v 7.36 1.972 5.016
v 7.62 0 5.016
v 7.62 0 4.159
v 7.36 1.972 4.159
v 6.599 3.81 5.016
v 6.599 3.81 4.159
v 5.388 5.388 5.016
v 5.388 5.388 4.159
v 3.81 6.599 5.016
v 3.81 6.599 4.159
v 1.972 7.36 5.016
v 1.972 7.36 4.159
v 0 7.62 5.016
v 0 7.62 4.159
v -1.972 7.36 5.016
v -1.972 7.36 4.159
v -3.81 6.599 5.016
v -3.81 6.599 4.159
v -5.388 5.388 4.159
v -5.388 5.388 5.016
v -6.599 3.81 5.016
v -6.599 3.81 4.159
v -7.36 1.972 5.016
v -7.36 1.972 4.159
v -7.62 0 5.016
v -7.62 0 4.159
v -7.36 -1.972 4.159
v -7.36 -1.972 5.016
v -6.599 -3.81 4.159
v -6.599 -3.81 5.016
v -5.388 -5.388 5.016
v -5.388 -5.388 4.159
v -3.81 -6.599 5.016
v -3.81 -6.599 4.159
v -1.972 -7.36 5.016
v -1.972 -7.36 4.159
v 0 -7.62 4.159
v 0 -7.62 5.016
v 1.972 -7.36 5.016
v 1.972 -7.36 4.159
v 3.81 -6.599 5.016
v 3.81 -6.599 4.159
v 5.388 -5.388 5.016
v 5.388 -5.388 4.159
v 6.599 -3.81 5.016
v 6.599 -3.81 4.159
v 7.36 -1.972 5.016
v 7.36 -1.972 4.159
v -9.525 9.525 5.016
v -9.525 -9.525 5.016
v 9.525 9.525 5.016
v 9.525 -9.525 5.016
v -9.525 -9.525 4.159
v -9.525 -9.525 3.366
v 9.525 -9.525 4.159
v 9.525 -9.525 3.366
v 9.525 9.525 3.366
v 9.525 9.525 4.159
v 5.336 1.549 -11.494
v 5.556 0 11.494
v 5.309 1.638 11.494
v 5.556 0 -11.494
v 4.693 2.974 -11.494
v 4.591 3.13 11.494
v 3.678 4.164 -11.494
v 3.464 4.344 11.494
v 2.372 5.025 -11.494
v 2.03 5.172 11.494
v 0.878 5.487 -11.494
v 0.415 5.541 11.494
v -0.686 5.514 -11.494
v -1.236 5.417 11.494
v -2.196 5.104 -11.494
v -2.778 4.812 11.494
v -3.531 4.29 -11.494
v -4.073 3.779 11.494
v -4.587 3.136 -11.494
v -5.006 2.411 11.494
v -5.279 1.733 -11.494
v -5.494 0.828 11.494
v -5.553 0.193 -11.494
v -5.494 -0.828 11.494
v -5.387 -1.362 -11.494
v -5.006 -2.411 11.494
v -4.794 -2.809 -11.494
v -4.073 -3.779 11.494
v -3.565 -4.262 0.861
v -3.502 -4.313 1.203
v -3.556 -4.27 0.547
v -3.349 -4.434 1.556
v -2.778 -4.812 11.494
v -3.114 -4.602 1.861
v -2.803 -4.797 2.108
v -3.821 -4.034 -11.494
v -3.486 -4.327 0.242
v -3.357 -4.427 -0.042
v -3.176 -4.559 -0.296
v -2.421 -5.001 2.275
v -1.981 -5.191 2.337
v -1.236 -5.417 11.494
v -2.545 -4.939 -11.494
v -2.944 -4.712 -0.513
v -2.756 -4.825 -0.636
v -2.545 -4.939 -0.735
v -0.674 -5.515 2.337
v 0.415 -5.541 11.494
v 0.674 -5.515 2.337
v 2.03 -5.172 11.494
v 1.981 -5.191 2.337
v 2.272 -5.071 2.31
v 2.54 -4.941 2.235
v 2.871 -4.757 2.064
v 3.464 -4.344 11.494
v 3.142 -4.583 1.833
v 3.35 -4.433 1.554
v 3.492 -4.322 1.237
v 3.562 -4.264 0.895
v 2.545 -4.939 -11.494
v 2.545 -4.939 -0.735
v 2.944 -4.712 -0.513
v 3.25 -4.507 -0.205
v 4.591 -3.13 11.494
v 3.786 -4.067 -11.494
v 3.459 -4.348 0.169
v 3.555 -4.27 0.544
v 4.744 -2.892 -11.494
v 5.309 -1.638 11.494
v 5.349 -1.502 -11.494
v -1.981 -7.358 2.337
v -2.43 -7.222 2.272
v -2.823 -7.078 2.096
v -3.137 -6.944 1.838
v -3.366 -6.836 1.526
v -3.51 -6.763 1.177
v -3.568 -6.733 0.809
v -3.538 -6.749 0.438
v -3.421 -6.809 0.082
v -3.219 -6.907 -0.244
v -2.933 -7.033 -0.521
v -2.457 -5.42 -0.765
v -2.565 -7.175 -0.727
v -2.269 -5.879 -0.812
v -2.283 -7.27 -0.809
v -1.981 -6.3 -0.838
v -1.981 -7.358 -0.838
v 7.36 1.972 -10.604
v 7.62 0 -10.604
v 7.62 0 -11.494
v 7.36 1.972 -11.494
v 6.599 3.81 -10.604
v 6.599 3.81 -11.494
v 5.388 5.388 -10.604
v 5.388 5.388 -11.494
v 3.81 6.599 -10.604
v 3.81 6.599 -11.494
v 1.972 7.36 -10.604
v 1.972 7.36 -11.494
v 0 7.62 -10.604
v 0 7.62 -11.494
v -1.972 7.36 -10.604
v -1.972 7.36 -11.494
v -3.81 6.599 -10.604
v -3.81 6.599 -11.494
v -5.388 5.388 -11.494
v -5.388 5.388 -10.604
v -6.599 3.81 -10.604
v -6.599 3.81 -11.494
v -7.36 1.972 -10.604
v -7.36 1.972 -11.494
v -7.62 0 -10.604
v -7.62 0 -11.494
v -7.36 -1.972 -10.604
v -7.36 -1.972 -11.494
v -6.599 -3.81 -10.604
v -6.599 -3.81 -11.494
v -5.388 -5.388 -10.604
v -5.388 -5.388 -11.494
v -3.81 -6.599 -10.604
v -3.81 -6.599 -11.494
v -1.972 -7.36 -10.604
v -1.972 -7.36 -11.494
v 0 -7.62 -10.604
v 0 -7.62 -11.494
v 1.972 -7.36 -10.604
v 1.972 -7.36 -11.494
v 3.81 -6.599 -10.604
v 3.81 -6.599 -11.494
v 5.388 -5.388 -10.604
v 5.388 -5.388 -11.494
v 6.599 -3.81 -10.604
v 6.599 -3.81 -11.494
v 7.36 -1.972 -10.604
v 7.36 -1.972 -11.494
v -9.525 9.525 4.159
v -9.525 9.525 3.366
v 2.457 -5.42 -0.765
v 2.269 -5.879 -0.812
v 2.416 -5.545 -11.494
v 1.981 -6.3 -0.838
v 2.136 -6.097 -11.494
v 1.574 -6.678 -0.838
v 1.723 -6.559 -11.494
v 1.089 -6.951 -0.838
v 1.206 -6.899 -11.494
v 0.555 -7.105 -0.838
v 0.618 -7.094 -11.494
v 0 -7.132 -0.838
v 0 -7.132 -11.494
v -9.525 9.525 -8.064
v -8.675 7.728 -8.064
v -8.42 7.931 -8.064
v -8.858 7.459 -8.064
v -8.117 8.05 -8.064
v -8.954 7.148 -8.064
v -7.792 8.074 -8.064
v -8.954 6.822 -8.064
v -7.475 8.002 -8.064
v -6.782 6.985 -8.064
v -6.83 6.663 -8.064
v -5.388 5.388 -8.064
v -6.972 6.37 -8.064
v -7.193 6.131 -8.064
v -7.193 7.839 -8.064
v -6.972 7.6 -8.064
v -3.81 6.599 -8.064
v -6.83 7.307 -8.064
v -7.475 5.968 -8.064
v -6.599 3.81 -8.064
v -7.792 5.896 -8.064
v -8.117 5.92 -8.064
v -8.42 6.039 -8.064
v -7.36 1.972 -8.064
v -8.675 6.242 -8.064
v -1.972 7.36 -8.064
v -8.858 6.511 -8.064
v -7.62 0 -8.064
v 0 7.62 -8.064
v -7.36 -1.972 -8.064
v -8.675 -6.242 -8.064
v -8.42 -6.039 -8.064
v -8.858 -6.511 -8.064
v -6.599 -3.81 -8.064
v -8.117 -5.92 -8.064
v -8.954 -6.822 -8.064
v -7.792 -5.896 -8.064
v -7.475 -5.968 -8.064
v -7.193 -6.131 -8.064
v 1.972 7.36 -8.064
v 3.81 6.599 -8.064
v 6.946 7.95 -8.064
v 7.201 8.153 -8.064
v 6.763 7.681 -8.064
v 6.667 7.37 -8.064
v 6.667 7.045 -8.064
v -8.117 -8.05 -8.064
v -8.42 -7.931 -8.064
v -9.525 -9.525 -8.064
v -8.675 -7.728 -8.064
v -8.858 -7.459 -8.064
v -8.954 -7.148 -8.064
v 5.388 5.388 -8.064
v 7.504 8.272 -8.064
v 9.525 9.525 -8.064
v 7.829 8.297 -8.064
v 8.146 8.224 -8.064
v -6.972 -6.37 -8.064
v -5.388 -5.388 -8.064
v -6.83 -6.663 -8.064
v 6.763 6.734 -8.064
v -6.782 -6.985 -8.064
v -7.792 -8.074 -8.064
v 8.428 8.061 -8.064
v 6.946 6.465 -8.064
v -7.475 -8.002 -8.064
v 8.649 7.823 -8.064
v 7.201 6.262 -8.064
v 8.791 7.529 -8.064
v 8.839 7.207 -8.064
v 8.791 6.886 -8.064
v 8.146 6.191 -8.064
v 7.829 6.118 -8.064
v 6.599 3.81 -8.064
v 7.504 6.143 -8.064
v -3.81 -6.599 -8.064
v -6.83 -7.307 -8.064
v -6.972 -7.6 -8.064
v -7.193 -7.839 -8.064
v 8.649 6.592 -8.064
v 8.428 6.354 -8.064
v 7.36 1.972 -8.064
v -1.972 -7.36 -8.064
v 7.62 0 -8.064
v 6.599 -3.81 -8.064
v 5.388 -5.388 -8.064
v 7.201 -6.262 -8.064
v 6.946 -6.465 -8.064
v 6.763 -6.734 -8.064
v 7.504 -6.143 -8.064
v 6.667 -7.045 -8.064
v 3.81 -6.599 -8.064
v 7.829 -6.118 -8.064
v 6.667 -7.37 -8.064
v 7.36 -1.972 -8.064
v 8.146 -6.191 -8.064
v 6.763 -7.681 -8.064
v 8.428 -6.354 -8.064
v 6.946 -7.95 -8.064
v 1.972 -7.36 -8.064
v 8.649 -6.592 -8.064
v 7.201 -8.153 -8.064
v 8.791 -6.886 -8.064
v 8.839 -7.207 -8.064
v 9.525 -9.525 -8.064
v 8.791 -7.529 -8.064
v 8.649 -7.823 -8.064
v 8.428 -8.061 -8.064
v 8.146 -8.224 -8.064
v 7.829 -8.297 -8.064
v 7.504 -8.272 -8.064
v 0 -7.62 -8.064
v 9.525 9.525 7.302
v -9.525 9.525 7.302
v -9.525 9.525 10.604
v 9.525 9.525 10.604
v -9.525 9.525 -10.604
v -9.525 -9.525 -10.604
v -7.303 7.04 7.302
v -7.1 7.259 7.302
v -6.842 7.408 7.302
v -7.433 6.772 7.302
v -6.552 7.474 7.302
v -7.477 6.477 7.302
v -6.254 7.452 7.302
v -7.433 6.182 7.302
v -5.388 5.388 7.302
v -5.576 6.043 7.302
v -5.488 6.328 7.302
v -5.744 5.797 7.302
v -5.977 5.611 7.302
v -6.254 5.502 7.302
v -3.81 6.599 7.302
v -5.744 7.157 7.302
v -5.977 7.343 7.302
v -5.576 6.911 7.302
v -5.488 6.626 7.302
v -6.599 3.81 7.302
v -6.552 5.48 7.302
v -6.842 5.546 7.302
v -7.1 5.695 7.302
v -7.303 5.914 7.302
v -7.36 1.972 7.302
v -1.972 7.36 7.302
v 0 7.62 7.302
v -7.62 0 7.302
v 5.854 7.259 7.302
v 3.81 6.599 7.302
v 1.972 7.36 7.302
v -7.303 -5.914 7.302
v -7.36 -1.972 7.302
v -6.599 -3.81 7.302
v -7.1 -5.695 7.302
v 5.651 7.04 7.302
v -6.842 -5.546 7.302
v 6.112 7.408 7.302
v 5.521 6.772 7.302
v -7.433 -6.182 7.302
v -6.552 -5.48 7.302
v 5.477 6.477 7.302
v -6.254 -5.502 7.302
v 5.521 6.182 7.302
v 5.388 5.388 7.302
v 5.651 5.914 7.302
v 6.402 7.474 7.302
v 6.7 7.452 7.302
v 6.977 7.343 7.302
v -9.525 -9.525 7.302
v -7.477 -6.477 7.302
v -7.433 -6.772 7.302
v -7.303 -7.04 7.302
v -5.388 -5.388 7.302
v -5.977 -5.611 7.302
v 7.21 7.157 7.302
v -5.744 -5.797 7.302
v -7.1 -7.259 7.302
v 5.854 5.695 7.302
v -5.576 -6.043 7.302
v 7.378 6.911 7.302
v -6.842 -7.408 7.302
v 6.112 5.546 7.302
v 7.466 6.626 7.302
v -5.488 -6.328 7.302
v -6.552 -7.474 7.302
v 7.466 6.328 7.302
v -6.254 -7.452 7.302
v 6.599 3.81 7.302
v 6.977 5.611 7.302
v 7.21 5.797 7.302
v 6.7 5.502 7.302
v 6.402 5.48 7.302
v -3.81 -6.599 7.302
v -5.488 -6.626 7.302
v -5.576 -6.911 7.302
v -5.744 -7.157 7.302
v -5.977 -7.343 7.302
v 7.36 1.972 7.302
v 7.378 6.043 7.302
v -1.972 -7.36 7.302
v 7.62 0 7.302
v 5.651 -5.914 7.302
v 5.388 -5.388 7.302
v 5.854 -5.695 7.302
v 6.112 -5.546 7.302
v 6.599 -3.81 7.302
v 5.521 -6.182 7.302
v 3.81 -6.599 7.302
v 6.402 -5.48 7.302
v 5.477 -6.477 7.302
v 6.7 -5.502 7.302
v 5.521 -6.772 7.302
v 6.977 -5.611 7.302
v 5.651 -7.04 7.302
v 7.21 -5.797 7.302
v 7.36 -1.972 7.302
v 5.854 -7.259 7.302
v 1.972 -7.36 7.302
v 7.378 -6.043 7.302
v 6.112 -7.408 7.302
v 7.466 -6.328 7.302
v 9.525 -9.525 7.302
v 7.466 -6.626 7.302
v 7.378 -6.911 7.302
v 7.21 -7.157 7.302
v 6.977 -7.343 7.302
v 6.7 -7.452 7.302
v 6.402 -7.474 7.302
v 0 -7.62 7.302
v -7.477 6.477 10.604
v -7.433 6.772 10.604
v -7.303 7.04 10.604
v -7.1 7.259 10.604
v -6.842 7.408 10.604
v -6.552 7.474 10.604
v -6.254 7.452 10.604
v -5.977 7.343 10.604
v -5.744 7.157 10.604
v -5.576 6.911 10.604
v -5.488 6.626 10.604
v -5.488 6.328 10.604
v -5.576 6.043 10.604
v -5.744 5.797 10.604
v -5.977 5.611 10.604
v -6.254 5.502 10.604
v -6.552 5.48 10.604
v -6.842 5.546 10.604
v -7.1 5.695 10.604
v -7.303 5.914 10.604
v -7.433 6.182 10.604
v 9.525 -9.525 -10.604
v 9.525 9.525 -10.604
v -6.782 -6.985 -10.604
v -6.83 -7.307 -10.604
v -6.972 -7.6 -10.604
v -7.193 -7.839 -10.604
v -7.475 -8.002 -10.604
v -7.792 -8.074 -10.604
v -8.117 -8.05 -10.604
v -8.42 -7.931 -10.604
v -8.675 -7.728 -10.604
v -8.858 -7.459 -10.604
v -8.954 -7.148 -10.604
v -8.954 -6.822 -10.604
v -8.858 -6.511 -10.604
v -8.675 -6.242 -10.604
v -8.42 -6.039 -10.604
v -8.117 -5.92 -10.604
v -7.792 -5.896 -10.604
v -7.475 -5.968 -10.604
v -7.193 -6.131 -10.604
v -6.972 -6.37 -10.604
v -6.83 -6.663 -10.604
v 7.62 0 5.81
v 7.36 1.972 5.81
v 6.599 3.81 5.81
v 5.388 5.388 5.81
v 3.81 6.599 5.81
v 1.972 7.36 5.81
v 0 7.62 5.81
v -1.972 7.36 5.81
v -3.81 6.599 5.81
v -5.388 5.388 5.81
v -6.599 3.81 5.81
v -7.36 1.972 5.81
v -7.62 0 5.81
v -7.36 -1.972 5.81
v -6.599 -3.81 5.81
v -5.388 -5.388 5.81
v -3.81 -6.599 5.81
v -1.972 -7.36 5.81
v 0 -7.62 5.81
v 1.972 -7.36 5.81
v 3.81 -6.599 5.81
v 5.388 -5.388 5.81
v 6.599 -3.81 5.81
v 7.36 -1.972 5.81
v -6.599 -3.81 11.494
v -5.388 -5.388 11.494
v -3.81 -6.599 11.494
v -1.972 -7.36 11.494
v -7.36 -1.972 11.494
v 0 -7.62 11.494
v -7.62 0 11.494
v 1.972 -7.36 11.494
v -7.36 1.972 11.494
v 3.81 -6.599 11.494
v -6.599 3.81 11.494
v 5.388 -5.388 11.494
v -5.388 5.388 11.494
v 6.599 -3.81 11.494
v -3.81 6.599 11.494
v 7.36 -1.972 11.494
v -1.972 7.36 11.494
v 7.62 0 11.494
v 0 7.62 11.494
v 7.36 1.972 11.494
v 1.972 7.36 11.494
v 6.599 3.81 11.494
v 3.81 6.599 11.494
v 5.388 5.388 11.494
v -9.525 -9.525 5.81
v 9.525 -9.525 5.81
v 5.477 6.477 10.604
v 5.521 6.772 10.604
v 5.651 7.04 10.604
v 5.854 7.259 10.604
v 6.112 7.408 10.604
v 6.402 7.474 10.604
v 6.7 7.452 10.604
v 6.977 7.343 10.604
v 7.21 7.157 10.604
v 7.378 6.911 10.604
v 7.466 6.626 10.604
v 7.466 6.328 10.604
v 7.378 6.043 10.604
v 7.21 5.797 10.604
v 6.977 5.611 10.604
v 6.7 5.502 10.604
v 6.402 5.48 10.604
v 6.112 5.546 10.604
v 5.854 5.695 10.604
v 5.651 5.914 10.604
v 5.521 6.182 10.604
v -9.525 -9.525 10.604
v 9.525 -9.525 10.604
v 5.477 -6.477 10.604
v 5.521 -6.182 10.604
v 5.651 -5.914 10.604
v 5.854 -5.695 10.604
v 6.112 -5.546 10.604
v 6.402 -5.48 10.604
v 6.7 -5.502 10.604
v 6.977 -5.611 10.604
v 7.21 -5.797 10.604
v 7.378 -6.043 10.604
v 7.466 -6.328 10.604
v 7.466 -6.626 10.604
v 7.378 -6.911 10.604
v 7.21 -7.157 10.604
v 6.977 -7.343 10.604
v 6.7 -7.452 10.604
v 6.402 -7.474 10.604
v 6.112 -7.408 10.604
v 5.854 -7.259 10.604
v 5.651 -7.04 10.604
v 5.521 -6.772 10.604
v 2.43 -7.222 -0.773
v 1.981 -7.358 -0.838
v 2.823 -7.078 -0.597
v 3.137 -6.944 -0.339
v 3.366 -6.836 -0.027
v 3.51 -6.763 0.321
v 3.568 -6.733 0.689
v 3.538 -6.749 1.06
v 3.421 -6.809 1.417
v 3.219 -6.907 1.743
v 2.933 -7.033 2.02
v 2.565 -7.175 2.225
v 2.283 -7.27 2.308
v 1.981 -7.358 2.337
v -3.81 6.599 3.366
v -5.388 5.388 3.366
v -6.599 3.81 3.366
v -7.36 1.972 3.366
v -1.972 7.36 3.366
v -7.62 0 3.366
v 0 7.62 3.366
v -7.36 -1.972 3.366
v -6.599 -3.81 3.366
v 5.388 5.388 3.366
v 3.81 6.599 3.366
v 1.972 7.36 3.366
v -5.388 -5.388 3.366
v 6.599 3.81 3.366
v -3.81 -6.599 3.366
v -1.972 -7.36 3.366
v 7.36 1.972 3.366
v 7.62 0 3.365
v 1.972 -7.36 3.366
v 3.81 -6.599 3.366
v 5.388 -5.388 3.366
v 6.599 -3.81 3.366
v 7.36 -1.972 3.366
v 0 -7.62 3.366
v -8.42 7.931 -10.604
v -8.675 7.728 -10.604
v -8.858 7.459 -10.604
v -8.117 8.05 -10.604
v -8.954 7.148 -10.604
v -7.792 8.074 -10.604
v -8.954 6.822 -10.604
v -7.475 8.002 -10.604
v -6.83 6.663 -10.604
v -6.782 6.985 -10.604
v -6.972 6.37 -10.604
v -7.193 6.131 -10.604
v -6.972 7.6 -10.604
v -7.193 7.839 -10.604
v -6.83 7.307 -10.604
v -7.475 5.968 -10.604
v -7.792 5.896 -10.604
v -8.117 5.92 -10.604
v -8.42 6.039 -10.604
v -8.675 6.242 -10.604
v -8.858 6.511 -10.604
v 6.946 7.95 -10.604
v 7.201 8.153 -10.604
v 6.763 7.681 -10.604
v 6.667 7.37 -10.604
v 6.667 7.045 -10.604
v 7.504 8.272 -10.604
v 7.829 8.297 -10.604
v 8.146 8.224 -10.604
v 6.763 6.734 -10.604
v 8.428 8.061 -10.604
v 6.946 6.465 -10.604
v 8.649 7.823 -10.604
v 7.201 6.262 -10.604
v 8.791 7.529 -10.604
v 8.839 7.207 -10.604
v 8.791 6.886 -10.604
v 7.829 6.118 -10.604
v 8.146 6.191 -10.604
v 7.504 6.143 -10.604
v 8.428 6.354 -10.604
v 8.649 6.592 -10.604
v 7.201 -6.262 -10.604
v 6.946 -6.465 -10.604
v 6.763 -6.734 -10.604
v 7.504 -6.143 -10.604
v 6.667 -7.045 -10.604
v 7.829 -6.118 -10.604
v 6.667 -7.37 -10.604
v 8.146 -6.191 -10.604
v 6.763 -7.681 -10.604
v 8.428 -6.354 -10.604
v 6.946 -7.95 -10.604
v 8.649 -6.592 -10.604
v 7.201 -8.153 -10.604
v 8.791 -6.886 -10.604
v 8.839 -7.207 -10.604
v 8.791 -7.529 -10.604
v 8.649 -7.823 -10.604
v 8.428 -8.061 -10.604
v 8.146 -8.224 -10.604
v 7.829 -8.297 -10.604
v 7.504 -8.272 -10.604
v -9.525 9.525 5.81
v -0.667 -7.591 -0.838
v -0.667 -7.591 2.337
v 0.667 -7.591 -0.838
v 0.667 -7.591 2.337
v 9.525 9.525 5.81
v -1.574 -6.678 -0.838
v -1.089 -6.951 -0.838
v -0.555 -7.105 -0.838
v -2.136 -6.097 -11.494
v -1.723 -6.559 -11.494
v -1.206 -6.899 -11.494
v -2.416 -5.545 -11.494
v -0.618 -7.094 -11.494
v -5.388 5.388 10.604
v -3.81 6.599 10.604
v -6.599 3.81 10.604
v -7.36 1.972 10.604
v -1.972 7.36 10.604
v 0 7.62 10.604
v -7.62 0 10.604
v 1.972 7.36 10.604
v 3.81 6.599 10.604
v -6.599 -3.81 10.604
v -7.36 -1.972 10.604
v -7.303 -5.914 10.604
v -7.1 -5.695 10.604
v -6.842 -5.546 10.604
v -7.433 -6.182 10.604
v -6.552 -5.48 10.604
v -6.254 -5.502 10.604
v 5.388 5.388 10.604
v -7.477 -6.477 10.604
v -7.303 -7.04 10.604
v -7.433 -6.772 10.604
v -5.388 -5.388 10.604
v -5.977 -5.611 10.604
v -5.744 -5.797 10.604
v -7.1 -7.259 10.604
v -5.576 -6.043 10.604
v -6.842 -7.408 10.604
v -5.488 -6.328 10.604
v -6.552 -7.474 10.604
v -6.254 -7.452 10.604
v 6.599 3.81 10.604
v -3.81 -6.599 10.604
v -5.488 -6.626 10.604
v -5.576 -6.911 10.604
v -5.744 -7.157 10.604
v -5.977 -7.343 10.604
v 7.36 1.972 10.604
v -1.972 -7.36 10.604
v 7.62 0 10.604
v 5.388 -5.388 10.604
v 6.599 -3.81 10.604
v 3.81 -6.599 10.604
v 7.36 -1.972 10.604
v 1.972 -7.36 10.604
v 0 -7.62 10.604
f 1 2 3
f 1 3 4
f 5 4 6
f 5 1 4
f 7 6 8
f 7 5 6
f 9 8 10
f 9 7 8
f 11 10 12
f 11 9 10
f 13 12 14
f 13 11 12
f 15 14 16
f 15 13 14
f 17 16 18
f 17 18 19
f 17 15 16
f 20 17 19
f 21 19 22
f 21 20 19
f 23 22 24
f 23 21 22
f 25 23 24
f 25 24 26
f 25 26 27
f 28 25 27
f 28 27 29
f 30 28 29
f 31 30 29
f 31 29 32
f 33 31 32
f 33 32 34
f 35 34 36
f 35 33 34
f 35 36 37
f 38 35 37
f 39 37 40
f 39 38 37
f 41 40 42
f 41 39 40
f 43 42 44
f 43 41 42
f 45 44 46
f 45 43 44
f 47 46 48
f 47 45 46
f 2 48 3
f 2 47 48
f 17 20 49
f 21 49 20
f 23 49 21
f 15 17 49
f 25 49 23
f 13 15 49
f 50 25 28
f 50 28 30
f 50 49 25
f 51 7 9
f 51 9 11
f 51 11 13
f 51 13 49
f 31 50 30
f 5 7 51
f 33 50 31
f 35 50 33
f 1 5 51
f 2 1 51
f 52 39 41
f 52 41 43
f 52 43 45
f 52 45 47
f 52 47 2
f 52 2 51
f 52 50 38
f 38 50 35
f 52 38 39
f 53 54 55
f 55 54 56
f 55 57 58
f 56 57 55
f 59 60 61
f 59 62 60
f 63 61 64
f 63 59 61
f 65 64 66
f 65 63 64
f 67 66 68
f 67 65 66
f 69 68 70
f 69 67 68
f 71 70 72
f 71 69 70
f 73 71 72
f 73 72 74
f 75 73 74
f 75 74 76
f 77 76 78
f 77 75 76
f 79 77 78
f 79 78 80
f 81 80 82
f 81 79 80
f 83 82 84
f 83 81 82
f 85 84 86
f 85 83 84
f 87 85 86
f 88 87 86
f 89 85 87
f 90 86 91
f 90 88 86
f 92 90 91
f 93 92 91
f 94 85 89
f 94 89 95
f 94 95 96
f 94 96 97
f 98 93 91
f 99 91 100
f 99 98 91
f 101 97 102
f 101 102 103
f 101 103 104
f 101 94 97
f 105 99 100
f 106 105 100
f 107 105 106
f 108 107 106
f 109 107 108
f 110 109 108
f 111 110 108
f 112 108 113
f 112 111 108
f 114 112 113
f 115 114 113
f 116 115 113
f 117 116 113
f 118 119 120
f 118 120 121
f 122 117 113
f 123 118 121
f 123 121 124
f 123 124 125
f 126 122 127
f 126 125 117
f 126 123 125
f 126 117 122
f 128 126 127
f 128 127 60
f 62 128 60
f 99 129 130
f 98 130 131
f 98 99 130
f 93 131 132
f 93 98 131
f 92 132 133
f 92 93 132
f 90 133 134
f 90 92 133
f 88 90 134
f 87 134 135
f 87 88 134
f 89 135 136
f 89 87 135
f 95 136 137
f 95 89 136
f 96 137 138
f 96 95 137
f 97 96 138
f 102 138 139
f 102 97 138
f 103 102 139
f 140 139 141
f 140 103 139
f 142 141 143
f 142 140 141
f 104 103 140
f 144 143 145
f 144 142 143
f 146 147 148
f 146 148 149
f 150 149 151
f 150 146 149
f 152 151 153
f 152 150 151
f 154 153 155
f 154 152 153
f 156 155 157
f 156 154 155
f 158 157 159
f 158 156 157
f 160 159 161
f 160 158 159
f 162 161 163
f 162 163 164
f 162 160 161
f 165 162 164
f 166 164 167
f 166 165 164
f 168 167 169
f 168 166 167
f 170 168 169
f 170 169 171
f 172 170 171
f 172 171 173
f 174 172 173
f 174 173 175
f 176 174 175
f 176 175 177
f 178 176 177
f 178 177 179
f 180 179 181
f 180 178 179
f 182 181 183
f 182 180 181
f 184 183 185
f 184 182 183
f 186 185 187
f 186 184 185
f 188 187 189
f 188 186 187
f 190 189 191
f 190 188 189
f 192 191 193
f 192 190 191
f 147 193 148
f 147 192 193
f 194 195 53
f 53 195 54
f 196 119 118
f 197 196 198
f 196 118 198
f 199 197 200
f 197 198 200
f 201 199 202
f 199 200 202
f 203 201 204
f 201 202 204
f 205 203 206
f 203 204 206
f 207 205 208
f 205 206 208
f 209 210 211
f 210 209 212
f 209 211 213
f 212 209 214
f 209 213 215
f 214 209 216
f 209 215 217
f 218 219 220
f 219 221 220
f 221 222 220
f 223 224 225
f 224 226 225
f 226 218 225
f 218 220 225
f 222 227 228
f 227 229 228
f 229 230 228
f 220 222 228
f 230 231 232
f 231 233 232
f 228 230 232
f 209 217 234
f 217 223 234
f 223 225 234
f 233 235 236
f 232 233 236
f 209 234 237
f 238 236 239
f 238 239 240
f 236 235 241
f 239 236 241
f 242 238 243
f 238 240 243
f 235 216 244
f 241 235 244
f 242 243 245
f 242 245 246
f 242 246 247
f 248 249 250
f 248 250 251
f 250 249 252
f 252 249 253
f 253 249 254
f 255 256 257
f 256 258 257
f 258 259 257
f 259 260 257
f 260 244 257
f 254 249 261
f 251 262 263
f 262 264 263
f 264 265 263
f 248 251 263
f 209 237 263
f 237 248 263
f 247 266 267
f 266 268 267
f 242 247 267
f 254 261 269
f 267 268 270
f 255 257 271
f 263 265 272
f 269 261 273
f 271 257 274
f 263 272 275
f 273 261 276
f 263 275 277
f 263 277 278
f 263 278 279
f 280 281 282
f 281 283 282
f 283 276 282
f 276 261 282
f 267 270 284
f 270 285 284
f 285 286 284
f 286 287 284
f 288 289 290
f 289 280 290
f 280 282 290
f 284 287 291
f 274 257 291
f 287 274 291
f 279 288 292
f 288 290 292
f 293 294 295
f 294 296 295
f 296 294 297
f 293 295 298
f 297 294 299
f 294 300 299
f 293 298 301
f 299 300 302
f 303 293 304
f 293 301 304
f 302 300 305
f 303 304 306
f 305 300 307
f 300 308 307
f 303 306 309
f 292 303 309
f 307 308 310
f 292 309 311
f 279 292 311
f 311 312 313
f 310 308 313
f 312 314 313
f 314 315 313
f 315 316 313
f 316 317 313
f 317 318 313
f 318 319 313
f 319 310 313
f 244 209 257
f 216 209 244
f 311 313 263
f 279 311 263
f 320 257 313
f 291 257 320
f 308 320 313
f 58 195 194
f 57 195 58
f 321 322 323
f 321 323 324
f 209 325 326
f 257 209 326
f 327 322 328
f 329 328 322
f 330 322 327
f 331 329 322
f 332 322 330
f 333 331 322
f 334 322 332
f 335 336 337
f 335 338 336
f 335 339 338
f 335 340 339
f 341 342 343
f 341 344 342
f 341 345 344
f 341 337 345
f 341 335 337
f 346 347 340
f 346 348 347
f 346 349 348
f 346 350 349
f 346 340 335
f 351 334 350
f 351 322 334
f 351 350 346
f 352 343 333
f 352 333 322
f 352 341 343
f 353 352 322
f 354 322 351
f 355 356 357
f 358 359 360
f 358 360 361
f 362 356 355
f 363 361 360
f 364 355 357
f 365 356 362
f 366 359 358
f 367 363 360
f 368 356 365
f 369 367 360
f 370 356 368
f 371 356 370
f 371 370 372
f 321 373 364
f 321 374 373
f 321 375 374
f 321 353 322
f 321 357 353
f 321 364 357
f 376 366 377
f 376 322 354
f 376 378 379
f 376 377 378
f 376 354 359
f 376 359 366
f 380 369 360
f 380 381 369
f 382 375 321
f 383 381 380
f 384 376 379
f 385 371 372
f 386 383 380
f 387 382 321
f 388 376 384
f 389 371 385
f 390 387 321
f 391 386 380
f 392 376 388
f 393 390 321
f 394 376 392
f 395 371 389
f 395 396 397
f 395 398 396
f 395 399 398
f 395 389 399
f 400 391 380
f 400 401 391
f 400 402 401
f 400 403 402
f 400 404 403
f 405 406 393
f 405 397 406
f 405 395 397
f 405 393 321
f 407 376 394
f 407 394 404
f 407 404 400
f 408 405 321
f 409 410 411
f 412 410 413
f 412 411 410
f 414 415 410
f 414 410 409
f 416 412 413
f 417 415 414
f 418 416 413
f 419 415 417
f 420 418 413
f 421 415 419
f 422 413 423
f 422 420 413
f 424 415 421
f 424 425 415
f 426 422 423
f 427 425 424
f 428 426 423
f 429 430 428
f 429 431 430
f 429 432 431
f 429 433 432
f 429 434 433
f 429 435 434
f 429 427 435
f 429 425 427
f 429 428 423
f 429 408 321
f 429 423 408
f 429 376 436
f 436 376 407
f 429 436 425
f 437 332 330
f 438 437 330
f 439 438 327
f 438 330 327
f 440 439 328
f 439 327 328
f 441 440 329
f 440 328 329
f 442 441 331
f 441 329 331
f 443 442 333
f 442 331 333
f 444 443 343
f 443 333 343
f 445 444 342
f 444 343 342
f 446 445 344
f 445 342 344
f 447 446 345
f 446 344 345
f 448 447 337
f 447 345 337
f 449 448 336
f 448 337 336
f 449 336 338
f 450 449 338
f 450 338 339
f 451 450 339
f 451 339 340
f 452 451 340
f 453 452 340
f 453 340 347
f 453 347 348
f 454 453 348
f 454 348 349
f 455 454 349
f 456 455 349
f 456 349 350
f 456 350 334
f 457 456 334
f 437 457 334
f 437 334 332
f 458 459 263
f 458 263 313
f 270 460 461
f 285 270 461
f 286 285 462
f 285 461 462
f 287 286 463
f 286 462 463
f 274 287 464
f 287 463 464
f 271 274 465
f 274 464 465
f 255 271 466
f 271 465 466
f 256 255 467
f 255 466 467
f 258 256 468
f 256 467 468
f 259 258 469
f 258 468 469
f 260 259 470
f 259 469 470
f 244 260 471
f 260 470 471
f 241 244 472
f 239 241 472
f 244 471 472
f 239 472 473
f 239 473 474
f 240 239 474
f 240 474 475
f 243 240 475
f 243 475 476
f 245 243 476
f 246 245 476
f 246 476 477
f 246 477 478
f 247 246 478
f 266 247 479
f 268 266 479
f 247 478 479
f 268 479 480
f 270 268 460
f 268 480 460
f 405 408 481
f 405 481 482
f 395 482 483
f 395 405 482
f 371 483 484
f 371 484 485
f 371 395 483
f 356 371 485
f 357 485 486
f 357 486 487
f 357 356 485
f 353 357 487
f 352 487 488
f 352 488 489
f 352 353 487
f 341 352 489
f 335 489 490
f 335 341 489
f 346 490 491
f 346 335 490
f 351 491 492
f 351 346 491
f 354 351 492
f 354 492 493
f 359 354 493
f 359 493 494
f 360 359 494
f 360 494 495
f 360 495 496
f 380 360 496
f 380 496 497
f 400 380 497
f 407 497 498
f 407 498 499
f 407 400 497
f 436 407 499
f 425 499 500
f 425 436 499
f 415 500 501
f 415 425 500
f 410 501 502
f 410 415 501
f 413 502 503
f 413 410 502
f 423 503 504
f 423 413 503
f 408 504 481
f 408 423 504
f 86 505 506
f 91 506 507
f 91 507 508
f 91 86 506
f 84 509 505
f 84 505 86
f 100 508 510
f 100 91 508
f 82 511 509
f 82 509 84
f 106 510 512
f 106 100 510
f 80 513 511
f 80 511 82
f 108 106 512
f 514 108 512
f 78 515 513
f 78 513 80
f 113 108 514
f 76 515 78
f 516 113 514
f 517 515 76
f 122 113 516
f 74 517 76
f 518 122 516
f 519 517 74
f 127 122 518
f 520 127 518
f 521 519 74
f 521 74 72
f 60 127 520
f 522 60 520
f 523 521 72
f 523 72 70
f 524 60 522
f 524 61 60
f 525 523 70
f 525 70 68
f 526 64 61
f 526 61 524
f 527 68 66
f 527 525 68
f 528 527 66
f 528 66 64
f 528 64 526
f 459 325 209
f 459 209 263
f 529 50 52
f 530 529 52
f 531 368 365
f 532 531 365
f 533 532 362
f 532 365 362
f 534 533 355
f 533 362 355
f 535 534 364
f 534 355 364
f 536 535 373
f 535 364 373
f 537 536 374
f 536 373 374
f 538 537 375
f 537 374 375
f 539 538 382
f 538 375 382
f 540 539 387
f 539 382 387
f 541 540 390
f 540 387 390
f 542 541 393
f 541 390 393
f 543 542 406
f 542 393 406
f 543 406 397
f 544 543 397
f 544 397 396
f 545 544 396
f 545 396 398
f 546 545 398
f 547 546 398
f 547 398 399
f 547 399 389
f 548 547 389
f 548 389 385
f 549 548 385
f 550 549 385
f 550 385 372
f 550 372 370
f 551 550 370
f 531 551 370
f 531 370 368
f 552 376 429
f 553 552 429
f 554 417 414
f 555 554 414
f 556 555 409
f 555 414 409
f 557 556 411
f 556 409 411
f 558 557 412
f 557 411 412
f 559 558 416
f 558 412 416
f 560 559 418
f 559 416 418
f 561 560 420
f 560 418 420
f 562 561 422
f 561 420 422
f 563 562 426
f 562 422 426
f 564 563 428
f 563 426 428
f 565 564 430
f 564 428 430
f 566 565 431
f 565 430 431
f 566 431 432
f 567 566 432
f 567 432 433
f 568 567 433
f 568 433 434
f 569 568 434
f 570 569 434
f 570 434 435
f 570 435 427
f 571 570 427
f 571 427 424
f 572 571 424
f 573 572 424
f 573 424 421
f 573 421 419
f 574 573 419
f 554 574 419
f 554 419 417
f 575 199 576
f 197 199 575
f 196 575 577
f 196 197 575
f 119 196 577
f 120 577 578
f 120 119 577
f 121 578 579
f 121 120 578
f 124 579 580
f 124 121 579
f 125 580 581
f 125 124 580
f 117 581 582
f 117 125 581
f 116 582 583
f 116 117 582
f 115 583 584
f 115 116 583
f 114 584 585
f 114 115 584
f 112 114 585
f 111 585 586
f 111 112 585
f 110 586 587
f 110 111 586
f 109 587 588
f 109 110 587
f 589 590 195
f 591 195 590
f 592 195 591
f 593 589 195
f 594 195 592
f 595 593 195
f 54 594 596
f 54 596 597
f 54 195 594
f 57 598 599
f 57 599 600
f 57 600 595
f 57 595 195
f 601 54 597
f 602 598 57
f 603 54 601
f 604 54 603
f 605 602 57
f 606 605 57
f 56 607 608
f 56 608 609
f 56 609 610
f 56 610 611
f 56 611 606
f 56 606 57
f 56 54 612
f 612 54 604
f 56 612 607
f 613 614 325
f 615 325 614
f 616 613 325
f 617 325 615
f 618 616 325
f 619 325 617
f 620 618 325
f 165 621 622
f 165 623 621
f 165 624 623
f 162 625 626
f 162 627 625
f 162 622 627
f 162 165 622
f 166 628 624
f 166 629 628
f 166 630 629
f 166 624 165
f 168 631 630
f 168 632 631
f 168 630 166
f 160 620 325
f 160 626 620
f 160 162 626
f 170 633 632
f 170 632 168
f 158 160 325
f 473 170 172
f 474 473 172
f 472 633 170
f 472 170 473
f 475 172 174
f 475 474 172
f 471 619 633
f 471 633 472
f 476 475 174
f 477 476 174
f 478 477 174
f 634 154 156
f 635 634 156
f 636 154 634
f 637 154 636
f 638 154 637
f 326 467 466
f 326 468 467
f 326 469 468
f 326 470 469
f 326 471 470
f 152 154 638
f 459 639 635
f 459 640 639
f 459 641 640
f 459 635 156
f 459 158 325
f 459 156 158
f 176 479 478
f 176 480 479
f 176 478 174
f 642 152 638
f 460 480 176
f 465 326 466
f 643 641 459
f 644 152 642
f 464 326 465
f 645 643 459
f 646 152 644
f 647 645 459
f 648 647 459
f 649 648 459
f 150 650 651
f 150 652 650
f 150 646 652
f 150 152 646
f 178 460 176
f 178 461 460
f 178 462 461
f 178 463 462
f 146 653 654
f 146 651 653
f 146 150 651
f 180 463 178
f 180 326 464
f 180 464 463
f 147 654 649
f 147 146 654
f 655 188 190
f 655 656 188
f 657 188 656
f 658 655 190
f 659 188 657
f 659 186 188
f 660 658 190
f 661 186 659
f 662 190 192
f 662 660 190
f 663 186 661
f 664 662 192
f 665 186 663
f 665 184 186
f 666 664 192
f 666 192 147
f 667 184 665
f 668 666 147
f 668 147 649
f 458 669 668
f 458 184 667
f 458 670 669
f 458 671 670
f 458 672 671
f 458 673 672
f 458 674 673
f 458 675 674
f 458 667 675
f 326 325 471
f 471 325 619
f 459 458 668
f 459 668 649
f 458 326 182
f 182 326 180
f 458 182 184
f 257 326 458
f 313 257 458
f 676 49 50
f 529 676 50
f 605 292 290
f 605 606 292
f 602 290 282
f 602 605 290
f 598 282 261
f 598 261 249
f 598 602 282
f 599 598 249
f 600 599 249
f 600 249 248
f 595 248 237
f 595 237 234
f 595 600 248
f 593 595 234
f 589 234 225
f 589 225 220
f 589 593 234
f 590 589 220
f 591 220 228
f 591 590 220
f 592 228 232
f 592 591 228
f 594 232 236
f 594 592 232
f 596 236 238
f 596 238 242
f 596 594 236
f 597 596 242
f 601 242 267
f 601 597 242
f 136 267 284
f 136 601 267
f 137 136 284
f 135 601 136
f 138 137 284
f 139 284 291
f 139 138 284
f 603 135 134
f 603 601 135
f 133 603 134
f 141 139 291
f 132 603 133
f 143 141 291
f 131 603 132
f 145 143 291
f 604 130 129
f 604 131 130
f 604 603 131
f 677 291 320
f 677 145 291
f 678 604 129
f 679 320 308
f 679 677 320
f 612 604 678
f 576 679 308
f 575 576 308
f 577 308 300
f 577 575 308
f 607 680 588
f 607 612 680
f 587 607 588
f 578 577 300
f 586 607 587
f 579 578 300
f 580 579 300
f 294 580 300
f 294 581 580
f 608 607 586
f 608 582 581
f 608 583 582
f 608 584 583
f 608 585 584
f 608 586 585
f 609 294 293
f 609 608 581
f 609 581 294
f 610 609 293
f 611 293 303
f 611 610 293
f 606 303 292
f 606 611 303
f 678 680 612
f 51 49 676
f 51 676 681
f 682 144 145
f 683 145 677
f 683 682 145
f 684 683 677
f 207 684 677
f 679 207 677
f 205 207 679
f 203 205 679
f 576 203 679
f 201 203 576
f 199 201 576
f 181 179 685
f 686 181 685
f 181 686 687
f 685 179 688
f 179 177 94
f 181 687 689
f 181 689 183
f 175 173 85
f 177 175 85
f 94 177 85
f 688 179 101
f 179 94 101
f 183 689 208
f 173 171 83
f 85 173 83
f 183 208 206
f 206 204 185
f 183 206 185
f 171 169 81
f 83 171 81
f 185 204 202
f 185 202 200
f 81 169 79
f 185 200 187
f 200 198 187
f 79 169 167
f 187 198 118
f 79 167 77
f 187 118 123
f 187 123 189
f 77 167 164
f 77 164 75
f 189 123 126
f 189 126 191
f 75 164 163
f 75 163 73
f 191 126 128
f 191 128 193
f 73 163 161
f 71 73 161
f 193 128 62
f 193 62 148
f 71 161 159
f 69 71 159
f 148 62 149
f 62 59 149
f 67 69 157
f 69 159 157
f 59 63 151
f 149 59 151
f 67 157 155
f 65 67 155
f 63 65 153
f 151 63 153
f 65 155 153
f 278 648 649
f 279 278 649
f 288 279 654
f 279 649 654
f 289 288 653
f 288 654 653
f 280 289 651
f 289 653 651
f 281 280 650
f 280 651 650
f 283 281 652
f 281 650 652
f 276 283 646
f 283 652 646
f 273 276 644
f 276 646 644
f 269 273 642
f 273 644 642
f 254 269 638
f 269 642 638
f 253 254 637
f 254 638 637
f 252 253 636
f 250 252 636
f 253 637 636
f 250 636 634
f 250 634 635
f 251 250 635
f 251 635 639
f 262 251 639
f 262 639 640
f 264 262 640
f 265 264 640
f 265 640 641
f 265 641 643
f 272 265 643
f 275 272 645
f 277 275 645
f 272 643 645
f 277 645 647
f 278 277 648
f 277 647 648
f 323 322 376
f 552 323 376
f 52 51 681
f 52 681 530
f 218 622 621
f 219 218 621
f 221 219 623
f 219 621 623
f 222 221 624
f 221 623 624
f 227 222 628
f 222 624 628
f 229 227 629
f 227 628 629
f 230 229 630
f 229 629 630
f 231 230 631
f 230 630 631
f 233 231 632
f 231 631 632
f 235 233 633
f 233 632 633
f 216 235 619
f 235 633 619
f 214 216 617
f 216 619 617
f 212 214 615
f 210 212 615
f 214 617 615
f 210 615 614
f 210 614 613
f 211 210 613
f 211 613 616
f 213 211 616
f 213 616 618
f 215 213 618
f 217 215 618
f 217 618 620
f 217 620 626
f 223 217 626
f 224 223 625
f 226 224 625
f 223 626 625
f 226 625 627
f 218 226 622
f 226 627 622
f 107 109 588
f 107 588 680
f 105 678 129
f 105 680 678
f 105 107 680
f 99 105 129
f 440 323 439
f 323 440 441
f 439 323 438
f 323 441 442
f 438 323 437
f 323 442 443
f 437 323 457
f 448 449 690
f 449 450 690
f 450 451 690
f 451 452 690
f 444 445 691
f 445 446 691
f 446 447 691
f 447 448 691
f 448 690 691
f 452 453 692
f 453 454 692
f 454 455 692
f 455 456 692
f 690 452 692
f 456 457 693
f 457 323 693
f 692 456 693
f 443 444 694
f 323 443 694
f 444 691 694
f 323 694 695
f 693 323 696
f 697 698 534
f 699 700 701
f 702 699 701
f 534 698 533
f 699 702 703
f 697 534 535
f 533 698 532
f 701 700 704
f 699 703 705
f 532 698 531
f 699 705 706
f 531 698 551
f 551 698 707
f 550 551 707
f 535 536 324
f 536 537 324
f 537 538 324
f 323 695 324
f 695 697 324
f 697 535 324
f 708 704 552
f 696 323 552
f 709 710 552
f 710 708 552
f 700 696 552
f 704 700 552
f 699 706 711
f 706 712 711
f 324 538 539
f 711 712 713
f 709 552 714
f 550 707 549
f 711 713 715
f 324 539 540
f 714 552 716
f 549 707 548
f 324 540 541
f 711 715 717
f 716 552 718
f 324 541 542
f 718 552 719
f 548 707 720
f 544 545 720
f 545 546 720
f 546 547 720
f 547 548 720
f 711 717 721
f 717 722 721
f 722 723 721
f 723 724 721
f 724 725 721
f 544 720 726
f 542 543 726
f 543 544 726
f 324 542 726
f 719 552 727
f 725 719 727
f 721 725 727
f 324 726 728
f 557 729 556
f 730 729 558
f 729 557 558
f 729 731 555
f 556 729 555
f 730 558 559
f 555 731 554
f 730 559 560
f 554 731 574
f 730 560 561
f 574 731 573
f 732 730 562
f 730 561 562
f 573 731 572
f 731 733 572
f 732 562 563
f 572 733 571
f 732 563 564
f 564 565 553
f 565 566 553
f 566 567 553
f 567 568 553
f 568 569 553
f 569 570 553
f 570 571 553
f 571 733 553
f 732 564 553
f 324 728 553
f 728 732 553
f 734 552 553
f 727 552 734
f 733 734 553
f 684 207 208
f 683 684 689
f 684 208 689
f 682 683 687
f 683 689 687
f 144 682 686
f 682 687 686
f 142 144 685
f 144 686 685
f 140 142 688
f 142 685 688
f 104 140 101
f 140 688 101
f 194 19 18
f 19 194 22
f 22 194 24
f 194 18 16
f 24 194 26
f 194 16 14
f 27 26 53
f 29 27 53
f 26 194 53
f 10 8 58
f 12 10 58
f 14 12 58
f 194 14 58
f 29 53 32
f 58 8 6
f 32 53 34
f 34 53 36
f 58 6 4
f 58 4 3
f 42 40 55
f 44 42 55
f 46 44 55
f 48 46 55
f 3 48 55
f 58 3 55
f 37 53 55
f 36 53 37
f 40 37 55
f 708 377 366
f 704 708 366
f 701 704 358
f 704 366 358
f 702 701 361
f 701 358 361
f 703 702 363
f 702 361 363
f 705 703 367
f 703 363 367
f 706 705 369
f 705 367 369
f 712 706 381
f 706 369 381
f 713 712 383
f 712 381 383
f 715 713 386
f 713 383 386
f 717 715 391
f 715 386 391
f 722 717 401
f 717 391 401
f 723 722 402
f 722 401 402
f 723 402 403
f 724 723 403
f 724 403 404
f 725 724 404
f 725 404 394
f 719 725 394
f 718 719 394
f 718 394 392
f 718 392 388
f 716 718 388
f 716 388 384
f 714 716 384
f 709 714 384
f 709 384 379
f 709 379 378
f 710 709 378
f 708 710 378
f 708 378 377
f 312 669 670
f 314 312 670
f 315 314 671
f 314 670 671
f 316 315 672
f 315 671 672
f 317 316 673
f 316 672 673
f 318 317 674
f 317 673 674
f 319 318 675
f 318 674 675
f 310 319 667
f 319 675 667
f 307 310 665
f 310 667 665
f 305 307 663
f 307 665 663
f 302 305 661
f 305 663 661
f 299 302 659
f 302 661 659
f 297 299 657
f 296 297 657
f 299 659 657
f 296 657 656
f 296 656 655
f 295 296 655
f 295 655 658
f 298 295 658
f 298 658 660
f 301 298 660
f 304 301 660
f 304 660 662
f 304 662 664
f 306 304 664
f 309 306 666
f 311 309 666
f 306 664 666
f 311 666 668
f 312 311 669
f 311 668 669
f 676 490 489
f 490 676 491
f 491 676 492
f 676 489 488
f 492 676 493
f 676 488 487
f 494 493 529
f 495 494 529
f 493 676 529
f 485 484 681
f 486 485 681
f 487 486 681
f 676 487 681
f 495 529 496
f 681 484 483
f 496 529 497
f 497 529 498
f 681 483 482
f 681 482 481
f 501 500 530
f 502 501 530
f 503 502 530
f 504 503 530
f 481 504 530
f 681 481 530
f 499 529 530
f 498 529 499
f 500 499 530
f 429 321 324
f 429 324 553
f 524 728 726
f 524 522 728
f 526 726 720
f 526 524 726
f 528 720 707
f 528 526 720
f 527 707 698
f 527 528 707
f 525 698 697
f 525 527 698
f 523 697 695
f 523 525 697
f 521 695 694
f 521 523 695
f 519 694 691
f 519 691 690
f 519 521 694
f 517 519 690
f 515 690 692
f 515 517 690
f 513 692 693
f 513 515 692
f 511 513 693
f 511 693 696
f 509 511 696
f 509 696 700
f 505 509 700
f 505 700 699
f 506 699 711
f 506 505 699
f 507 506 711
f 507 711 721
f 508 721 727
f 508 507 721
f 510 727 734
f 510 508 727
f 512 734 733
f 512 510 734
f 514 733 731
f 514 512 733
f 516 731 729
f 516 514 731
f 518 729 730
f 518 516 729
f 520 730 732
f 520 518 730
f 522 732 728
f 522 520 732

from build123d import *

# Parameters (mm, degrees)
F0_R      = 7.62
F0_R_2    = 5.55625
F1_DEPTH  = 11.4935
F3_W      = 19.05
F3_H      = 19.05
F3_R      = 5.55625
F4_DEPTH  = 2.54
F6_W      = 19.05
F6_H      = 19.05
F6_R      = 5.55625
F7_DEPTH  = 0.79375
F9_W      = 19.05
F9_H      = 19.05
F9_R      = 5.55625
F10_DEPTH = 0.79375
F12_W     = 19.05
F12_H     = 19.05
F12_R     = 5.55625
F13_DEPTH = 3.302
F15_D     = 1.999996
F15_DEPTH = 3.302
F16_R     = 1.0922
F17_DEPTH = 2.54
F19_DEPTH = 11.43
F21_DEPTH = 11.43


with BuildPart() as f1:
    # F0 (on Top) → F1 (new body, symmetric)
    with BuildSketch(Plane.XY):
        Circle(F0_R)
        Circle(F0_R_2, mode=Mode.SUBTRACT)
    extrude(amount=F1_DEPTH, both=True)

    # F3 (on offset) → F4 (join)
    with BuildSketch(Plane(origin=(0, 0, -10.6045), x_dir=(1, 0, 0), z_dir=(0, 0, -1))):
        Rectangle(F3_W, F3_H)
        Circle(F3_R, mode=Mode.SUBTRACT)
    extrude(amount=-F4_DEPTH)

    # F6 (on offset) → F7 (join)
    with BuildSketch(Plane(origin=(0, 0, 3.3655), x_dir=(1, 0, 0), z_dir=(0, 0, -1))):
        Rectangle(F6_W, F6_H)
        Circle(F6_R, mode=Mode.SUBTRACT)
    extrude(amount=-F7_DEPTH)

    # F9 (on offset) → F10 (join)
    with BuildSketch(Plane(origin=(0, 0, 5.0165), x_dir=(1, 0, 0), z_dir=(0, 0, -1))):
        Rectangle(F9_W, F9_H)
        Circle(F9_R, mode=Mode.SUBTRACT)
    extrude(amount=-F10_DEPTH)

    # F12 (on offset) → F13 (join)
    with BuildSketch(Plane(origin=(0, 0, 7.3025), x_dir=(1, 0, 0), z_dir=(0, 0, -1))):
        Rectangle(F12_W, F12_H)
        Circle(F12_R, mode=Mode.SUBTRACT)
    extrude(amount=-F13_DEPTH)

    # F15
    with Locations(Plane.XY.offset(10.6045)):
        with Locations((-6.477, -6.477), (-6.477, 6.477), (6.477, 6.477), (6.477, -6.477)):
            Hole(F15_D / 2, depth=F15_DEPTH)

    # F16 (on face) → F17 (cut, through all)
    with BuildSketch(Plane(origin=(0, 0, -10.6045), x_dir=(1, 0, 0), z_dir=(0, 0, -1))):
        with Locations((-7.874, 6.985)):
            Circle(F16_R)
        with Locations((7.747, 7.207488)):
            Circle(F16_R)
        with Locations((7.747, -7.207488)):
            Circle(F16_R)
        with Locations((-7.874, -6.985)):
            Circle(F16_R)
    extrude(amount=-F17_DEPTH, mode=Mode.SUBTRACT)

    # F18 (on face) → F19 (cut)
    with BuildSketch(Plane(origin=(0, 0, -11.4935), x_dir=(1, 0, 0), z_dir=(0, 0, -1))):
        with BuildLine():
            ThreePointArc((2.54519, 4.93902), (1.723461, 6.558707), (0, 7.131685))
            ThreePointArc((0, 7.131685), (-1.723461, 6.558707), (-2.54519, 4.93902))
            ThreePointArc((-2.54519, 4.93902), (0, 5.55625), (2.54519, 4.93902))
        make_face()
    extrude(amount=-F19_DEPTH, mode=Mode.SUBTRACT)

    # F20 (on Front) → F21 (cut)
    with BuildSketch(Plane.XZ):
        with BuildLine():
            Line((1.9812, 2.3368), (-1.9812, 2.3368))
            ThreePointArc((-1.9812, 2.3368), (-3.5687, 0.7493), (-1.9812, -0.8382))
            Line((-1.9812, -0.8382), (1.9812, -0.8382))
            ThreePointArc((1.9812, -0.8382), (3.5687, 0.7493), (1.9812, 2.3368))
        make_face()
    extrude(amount=F21_DEPTH, mode=Mode.SUBTRACT)


solid = f1.part
